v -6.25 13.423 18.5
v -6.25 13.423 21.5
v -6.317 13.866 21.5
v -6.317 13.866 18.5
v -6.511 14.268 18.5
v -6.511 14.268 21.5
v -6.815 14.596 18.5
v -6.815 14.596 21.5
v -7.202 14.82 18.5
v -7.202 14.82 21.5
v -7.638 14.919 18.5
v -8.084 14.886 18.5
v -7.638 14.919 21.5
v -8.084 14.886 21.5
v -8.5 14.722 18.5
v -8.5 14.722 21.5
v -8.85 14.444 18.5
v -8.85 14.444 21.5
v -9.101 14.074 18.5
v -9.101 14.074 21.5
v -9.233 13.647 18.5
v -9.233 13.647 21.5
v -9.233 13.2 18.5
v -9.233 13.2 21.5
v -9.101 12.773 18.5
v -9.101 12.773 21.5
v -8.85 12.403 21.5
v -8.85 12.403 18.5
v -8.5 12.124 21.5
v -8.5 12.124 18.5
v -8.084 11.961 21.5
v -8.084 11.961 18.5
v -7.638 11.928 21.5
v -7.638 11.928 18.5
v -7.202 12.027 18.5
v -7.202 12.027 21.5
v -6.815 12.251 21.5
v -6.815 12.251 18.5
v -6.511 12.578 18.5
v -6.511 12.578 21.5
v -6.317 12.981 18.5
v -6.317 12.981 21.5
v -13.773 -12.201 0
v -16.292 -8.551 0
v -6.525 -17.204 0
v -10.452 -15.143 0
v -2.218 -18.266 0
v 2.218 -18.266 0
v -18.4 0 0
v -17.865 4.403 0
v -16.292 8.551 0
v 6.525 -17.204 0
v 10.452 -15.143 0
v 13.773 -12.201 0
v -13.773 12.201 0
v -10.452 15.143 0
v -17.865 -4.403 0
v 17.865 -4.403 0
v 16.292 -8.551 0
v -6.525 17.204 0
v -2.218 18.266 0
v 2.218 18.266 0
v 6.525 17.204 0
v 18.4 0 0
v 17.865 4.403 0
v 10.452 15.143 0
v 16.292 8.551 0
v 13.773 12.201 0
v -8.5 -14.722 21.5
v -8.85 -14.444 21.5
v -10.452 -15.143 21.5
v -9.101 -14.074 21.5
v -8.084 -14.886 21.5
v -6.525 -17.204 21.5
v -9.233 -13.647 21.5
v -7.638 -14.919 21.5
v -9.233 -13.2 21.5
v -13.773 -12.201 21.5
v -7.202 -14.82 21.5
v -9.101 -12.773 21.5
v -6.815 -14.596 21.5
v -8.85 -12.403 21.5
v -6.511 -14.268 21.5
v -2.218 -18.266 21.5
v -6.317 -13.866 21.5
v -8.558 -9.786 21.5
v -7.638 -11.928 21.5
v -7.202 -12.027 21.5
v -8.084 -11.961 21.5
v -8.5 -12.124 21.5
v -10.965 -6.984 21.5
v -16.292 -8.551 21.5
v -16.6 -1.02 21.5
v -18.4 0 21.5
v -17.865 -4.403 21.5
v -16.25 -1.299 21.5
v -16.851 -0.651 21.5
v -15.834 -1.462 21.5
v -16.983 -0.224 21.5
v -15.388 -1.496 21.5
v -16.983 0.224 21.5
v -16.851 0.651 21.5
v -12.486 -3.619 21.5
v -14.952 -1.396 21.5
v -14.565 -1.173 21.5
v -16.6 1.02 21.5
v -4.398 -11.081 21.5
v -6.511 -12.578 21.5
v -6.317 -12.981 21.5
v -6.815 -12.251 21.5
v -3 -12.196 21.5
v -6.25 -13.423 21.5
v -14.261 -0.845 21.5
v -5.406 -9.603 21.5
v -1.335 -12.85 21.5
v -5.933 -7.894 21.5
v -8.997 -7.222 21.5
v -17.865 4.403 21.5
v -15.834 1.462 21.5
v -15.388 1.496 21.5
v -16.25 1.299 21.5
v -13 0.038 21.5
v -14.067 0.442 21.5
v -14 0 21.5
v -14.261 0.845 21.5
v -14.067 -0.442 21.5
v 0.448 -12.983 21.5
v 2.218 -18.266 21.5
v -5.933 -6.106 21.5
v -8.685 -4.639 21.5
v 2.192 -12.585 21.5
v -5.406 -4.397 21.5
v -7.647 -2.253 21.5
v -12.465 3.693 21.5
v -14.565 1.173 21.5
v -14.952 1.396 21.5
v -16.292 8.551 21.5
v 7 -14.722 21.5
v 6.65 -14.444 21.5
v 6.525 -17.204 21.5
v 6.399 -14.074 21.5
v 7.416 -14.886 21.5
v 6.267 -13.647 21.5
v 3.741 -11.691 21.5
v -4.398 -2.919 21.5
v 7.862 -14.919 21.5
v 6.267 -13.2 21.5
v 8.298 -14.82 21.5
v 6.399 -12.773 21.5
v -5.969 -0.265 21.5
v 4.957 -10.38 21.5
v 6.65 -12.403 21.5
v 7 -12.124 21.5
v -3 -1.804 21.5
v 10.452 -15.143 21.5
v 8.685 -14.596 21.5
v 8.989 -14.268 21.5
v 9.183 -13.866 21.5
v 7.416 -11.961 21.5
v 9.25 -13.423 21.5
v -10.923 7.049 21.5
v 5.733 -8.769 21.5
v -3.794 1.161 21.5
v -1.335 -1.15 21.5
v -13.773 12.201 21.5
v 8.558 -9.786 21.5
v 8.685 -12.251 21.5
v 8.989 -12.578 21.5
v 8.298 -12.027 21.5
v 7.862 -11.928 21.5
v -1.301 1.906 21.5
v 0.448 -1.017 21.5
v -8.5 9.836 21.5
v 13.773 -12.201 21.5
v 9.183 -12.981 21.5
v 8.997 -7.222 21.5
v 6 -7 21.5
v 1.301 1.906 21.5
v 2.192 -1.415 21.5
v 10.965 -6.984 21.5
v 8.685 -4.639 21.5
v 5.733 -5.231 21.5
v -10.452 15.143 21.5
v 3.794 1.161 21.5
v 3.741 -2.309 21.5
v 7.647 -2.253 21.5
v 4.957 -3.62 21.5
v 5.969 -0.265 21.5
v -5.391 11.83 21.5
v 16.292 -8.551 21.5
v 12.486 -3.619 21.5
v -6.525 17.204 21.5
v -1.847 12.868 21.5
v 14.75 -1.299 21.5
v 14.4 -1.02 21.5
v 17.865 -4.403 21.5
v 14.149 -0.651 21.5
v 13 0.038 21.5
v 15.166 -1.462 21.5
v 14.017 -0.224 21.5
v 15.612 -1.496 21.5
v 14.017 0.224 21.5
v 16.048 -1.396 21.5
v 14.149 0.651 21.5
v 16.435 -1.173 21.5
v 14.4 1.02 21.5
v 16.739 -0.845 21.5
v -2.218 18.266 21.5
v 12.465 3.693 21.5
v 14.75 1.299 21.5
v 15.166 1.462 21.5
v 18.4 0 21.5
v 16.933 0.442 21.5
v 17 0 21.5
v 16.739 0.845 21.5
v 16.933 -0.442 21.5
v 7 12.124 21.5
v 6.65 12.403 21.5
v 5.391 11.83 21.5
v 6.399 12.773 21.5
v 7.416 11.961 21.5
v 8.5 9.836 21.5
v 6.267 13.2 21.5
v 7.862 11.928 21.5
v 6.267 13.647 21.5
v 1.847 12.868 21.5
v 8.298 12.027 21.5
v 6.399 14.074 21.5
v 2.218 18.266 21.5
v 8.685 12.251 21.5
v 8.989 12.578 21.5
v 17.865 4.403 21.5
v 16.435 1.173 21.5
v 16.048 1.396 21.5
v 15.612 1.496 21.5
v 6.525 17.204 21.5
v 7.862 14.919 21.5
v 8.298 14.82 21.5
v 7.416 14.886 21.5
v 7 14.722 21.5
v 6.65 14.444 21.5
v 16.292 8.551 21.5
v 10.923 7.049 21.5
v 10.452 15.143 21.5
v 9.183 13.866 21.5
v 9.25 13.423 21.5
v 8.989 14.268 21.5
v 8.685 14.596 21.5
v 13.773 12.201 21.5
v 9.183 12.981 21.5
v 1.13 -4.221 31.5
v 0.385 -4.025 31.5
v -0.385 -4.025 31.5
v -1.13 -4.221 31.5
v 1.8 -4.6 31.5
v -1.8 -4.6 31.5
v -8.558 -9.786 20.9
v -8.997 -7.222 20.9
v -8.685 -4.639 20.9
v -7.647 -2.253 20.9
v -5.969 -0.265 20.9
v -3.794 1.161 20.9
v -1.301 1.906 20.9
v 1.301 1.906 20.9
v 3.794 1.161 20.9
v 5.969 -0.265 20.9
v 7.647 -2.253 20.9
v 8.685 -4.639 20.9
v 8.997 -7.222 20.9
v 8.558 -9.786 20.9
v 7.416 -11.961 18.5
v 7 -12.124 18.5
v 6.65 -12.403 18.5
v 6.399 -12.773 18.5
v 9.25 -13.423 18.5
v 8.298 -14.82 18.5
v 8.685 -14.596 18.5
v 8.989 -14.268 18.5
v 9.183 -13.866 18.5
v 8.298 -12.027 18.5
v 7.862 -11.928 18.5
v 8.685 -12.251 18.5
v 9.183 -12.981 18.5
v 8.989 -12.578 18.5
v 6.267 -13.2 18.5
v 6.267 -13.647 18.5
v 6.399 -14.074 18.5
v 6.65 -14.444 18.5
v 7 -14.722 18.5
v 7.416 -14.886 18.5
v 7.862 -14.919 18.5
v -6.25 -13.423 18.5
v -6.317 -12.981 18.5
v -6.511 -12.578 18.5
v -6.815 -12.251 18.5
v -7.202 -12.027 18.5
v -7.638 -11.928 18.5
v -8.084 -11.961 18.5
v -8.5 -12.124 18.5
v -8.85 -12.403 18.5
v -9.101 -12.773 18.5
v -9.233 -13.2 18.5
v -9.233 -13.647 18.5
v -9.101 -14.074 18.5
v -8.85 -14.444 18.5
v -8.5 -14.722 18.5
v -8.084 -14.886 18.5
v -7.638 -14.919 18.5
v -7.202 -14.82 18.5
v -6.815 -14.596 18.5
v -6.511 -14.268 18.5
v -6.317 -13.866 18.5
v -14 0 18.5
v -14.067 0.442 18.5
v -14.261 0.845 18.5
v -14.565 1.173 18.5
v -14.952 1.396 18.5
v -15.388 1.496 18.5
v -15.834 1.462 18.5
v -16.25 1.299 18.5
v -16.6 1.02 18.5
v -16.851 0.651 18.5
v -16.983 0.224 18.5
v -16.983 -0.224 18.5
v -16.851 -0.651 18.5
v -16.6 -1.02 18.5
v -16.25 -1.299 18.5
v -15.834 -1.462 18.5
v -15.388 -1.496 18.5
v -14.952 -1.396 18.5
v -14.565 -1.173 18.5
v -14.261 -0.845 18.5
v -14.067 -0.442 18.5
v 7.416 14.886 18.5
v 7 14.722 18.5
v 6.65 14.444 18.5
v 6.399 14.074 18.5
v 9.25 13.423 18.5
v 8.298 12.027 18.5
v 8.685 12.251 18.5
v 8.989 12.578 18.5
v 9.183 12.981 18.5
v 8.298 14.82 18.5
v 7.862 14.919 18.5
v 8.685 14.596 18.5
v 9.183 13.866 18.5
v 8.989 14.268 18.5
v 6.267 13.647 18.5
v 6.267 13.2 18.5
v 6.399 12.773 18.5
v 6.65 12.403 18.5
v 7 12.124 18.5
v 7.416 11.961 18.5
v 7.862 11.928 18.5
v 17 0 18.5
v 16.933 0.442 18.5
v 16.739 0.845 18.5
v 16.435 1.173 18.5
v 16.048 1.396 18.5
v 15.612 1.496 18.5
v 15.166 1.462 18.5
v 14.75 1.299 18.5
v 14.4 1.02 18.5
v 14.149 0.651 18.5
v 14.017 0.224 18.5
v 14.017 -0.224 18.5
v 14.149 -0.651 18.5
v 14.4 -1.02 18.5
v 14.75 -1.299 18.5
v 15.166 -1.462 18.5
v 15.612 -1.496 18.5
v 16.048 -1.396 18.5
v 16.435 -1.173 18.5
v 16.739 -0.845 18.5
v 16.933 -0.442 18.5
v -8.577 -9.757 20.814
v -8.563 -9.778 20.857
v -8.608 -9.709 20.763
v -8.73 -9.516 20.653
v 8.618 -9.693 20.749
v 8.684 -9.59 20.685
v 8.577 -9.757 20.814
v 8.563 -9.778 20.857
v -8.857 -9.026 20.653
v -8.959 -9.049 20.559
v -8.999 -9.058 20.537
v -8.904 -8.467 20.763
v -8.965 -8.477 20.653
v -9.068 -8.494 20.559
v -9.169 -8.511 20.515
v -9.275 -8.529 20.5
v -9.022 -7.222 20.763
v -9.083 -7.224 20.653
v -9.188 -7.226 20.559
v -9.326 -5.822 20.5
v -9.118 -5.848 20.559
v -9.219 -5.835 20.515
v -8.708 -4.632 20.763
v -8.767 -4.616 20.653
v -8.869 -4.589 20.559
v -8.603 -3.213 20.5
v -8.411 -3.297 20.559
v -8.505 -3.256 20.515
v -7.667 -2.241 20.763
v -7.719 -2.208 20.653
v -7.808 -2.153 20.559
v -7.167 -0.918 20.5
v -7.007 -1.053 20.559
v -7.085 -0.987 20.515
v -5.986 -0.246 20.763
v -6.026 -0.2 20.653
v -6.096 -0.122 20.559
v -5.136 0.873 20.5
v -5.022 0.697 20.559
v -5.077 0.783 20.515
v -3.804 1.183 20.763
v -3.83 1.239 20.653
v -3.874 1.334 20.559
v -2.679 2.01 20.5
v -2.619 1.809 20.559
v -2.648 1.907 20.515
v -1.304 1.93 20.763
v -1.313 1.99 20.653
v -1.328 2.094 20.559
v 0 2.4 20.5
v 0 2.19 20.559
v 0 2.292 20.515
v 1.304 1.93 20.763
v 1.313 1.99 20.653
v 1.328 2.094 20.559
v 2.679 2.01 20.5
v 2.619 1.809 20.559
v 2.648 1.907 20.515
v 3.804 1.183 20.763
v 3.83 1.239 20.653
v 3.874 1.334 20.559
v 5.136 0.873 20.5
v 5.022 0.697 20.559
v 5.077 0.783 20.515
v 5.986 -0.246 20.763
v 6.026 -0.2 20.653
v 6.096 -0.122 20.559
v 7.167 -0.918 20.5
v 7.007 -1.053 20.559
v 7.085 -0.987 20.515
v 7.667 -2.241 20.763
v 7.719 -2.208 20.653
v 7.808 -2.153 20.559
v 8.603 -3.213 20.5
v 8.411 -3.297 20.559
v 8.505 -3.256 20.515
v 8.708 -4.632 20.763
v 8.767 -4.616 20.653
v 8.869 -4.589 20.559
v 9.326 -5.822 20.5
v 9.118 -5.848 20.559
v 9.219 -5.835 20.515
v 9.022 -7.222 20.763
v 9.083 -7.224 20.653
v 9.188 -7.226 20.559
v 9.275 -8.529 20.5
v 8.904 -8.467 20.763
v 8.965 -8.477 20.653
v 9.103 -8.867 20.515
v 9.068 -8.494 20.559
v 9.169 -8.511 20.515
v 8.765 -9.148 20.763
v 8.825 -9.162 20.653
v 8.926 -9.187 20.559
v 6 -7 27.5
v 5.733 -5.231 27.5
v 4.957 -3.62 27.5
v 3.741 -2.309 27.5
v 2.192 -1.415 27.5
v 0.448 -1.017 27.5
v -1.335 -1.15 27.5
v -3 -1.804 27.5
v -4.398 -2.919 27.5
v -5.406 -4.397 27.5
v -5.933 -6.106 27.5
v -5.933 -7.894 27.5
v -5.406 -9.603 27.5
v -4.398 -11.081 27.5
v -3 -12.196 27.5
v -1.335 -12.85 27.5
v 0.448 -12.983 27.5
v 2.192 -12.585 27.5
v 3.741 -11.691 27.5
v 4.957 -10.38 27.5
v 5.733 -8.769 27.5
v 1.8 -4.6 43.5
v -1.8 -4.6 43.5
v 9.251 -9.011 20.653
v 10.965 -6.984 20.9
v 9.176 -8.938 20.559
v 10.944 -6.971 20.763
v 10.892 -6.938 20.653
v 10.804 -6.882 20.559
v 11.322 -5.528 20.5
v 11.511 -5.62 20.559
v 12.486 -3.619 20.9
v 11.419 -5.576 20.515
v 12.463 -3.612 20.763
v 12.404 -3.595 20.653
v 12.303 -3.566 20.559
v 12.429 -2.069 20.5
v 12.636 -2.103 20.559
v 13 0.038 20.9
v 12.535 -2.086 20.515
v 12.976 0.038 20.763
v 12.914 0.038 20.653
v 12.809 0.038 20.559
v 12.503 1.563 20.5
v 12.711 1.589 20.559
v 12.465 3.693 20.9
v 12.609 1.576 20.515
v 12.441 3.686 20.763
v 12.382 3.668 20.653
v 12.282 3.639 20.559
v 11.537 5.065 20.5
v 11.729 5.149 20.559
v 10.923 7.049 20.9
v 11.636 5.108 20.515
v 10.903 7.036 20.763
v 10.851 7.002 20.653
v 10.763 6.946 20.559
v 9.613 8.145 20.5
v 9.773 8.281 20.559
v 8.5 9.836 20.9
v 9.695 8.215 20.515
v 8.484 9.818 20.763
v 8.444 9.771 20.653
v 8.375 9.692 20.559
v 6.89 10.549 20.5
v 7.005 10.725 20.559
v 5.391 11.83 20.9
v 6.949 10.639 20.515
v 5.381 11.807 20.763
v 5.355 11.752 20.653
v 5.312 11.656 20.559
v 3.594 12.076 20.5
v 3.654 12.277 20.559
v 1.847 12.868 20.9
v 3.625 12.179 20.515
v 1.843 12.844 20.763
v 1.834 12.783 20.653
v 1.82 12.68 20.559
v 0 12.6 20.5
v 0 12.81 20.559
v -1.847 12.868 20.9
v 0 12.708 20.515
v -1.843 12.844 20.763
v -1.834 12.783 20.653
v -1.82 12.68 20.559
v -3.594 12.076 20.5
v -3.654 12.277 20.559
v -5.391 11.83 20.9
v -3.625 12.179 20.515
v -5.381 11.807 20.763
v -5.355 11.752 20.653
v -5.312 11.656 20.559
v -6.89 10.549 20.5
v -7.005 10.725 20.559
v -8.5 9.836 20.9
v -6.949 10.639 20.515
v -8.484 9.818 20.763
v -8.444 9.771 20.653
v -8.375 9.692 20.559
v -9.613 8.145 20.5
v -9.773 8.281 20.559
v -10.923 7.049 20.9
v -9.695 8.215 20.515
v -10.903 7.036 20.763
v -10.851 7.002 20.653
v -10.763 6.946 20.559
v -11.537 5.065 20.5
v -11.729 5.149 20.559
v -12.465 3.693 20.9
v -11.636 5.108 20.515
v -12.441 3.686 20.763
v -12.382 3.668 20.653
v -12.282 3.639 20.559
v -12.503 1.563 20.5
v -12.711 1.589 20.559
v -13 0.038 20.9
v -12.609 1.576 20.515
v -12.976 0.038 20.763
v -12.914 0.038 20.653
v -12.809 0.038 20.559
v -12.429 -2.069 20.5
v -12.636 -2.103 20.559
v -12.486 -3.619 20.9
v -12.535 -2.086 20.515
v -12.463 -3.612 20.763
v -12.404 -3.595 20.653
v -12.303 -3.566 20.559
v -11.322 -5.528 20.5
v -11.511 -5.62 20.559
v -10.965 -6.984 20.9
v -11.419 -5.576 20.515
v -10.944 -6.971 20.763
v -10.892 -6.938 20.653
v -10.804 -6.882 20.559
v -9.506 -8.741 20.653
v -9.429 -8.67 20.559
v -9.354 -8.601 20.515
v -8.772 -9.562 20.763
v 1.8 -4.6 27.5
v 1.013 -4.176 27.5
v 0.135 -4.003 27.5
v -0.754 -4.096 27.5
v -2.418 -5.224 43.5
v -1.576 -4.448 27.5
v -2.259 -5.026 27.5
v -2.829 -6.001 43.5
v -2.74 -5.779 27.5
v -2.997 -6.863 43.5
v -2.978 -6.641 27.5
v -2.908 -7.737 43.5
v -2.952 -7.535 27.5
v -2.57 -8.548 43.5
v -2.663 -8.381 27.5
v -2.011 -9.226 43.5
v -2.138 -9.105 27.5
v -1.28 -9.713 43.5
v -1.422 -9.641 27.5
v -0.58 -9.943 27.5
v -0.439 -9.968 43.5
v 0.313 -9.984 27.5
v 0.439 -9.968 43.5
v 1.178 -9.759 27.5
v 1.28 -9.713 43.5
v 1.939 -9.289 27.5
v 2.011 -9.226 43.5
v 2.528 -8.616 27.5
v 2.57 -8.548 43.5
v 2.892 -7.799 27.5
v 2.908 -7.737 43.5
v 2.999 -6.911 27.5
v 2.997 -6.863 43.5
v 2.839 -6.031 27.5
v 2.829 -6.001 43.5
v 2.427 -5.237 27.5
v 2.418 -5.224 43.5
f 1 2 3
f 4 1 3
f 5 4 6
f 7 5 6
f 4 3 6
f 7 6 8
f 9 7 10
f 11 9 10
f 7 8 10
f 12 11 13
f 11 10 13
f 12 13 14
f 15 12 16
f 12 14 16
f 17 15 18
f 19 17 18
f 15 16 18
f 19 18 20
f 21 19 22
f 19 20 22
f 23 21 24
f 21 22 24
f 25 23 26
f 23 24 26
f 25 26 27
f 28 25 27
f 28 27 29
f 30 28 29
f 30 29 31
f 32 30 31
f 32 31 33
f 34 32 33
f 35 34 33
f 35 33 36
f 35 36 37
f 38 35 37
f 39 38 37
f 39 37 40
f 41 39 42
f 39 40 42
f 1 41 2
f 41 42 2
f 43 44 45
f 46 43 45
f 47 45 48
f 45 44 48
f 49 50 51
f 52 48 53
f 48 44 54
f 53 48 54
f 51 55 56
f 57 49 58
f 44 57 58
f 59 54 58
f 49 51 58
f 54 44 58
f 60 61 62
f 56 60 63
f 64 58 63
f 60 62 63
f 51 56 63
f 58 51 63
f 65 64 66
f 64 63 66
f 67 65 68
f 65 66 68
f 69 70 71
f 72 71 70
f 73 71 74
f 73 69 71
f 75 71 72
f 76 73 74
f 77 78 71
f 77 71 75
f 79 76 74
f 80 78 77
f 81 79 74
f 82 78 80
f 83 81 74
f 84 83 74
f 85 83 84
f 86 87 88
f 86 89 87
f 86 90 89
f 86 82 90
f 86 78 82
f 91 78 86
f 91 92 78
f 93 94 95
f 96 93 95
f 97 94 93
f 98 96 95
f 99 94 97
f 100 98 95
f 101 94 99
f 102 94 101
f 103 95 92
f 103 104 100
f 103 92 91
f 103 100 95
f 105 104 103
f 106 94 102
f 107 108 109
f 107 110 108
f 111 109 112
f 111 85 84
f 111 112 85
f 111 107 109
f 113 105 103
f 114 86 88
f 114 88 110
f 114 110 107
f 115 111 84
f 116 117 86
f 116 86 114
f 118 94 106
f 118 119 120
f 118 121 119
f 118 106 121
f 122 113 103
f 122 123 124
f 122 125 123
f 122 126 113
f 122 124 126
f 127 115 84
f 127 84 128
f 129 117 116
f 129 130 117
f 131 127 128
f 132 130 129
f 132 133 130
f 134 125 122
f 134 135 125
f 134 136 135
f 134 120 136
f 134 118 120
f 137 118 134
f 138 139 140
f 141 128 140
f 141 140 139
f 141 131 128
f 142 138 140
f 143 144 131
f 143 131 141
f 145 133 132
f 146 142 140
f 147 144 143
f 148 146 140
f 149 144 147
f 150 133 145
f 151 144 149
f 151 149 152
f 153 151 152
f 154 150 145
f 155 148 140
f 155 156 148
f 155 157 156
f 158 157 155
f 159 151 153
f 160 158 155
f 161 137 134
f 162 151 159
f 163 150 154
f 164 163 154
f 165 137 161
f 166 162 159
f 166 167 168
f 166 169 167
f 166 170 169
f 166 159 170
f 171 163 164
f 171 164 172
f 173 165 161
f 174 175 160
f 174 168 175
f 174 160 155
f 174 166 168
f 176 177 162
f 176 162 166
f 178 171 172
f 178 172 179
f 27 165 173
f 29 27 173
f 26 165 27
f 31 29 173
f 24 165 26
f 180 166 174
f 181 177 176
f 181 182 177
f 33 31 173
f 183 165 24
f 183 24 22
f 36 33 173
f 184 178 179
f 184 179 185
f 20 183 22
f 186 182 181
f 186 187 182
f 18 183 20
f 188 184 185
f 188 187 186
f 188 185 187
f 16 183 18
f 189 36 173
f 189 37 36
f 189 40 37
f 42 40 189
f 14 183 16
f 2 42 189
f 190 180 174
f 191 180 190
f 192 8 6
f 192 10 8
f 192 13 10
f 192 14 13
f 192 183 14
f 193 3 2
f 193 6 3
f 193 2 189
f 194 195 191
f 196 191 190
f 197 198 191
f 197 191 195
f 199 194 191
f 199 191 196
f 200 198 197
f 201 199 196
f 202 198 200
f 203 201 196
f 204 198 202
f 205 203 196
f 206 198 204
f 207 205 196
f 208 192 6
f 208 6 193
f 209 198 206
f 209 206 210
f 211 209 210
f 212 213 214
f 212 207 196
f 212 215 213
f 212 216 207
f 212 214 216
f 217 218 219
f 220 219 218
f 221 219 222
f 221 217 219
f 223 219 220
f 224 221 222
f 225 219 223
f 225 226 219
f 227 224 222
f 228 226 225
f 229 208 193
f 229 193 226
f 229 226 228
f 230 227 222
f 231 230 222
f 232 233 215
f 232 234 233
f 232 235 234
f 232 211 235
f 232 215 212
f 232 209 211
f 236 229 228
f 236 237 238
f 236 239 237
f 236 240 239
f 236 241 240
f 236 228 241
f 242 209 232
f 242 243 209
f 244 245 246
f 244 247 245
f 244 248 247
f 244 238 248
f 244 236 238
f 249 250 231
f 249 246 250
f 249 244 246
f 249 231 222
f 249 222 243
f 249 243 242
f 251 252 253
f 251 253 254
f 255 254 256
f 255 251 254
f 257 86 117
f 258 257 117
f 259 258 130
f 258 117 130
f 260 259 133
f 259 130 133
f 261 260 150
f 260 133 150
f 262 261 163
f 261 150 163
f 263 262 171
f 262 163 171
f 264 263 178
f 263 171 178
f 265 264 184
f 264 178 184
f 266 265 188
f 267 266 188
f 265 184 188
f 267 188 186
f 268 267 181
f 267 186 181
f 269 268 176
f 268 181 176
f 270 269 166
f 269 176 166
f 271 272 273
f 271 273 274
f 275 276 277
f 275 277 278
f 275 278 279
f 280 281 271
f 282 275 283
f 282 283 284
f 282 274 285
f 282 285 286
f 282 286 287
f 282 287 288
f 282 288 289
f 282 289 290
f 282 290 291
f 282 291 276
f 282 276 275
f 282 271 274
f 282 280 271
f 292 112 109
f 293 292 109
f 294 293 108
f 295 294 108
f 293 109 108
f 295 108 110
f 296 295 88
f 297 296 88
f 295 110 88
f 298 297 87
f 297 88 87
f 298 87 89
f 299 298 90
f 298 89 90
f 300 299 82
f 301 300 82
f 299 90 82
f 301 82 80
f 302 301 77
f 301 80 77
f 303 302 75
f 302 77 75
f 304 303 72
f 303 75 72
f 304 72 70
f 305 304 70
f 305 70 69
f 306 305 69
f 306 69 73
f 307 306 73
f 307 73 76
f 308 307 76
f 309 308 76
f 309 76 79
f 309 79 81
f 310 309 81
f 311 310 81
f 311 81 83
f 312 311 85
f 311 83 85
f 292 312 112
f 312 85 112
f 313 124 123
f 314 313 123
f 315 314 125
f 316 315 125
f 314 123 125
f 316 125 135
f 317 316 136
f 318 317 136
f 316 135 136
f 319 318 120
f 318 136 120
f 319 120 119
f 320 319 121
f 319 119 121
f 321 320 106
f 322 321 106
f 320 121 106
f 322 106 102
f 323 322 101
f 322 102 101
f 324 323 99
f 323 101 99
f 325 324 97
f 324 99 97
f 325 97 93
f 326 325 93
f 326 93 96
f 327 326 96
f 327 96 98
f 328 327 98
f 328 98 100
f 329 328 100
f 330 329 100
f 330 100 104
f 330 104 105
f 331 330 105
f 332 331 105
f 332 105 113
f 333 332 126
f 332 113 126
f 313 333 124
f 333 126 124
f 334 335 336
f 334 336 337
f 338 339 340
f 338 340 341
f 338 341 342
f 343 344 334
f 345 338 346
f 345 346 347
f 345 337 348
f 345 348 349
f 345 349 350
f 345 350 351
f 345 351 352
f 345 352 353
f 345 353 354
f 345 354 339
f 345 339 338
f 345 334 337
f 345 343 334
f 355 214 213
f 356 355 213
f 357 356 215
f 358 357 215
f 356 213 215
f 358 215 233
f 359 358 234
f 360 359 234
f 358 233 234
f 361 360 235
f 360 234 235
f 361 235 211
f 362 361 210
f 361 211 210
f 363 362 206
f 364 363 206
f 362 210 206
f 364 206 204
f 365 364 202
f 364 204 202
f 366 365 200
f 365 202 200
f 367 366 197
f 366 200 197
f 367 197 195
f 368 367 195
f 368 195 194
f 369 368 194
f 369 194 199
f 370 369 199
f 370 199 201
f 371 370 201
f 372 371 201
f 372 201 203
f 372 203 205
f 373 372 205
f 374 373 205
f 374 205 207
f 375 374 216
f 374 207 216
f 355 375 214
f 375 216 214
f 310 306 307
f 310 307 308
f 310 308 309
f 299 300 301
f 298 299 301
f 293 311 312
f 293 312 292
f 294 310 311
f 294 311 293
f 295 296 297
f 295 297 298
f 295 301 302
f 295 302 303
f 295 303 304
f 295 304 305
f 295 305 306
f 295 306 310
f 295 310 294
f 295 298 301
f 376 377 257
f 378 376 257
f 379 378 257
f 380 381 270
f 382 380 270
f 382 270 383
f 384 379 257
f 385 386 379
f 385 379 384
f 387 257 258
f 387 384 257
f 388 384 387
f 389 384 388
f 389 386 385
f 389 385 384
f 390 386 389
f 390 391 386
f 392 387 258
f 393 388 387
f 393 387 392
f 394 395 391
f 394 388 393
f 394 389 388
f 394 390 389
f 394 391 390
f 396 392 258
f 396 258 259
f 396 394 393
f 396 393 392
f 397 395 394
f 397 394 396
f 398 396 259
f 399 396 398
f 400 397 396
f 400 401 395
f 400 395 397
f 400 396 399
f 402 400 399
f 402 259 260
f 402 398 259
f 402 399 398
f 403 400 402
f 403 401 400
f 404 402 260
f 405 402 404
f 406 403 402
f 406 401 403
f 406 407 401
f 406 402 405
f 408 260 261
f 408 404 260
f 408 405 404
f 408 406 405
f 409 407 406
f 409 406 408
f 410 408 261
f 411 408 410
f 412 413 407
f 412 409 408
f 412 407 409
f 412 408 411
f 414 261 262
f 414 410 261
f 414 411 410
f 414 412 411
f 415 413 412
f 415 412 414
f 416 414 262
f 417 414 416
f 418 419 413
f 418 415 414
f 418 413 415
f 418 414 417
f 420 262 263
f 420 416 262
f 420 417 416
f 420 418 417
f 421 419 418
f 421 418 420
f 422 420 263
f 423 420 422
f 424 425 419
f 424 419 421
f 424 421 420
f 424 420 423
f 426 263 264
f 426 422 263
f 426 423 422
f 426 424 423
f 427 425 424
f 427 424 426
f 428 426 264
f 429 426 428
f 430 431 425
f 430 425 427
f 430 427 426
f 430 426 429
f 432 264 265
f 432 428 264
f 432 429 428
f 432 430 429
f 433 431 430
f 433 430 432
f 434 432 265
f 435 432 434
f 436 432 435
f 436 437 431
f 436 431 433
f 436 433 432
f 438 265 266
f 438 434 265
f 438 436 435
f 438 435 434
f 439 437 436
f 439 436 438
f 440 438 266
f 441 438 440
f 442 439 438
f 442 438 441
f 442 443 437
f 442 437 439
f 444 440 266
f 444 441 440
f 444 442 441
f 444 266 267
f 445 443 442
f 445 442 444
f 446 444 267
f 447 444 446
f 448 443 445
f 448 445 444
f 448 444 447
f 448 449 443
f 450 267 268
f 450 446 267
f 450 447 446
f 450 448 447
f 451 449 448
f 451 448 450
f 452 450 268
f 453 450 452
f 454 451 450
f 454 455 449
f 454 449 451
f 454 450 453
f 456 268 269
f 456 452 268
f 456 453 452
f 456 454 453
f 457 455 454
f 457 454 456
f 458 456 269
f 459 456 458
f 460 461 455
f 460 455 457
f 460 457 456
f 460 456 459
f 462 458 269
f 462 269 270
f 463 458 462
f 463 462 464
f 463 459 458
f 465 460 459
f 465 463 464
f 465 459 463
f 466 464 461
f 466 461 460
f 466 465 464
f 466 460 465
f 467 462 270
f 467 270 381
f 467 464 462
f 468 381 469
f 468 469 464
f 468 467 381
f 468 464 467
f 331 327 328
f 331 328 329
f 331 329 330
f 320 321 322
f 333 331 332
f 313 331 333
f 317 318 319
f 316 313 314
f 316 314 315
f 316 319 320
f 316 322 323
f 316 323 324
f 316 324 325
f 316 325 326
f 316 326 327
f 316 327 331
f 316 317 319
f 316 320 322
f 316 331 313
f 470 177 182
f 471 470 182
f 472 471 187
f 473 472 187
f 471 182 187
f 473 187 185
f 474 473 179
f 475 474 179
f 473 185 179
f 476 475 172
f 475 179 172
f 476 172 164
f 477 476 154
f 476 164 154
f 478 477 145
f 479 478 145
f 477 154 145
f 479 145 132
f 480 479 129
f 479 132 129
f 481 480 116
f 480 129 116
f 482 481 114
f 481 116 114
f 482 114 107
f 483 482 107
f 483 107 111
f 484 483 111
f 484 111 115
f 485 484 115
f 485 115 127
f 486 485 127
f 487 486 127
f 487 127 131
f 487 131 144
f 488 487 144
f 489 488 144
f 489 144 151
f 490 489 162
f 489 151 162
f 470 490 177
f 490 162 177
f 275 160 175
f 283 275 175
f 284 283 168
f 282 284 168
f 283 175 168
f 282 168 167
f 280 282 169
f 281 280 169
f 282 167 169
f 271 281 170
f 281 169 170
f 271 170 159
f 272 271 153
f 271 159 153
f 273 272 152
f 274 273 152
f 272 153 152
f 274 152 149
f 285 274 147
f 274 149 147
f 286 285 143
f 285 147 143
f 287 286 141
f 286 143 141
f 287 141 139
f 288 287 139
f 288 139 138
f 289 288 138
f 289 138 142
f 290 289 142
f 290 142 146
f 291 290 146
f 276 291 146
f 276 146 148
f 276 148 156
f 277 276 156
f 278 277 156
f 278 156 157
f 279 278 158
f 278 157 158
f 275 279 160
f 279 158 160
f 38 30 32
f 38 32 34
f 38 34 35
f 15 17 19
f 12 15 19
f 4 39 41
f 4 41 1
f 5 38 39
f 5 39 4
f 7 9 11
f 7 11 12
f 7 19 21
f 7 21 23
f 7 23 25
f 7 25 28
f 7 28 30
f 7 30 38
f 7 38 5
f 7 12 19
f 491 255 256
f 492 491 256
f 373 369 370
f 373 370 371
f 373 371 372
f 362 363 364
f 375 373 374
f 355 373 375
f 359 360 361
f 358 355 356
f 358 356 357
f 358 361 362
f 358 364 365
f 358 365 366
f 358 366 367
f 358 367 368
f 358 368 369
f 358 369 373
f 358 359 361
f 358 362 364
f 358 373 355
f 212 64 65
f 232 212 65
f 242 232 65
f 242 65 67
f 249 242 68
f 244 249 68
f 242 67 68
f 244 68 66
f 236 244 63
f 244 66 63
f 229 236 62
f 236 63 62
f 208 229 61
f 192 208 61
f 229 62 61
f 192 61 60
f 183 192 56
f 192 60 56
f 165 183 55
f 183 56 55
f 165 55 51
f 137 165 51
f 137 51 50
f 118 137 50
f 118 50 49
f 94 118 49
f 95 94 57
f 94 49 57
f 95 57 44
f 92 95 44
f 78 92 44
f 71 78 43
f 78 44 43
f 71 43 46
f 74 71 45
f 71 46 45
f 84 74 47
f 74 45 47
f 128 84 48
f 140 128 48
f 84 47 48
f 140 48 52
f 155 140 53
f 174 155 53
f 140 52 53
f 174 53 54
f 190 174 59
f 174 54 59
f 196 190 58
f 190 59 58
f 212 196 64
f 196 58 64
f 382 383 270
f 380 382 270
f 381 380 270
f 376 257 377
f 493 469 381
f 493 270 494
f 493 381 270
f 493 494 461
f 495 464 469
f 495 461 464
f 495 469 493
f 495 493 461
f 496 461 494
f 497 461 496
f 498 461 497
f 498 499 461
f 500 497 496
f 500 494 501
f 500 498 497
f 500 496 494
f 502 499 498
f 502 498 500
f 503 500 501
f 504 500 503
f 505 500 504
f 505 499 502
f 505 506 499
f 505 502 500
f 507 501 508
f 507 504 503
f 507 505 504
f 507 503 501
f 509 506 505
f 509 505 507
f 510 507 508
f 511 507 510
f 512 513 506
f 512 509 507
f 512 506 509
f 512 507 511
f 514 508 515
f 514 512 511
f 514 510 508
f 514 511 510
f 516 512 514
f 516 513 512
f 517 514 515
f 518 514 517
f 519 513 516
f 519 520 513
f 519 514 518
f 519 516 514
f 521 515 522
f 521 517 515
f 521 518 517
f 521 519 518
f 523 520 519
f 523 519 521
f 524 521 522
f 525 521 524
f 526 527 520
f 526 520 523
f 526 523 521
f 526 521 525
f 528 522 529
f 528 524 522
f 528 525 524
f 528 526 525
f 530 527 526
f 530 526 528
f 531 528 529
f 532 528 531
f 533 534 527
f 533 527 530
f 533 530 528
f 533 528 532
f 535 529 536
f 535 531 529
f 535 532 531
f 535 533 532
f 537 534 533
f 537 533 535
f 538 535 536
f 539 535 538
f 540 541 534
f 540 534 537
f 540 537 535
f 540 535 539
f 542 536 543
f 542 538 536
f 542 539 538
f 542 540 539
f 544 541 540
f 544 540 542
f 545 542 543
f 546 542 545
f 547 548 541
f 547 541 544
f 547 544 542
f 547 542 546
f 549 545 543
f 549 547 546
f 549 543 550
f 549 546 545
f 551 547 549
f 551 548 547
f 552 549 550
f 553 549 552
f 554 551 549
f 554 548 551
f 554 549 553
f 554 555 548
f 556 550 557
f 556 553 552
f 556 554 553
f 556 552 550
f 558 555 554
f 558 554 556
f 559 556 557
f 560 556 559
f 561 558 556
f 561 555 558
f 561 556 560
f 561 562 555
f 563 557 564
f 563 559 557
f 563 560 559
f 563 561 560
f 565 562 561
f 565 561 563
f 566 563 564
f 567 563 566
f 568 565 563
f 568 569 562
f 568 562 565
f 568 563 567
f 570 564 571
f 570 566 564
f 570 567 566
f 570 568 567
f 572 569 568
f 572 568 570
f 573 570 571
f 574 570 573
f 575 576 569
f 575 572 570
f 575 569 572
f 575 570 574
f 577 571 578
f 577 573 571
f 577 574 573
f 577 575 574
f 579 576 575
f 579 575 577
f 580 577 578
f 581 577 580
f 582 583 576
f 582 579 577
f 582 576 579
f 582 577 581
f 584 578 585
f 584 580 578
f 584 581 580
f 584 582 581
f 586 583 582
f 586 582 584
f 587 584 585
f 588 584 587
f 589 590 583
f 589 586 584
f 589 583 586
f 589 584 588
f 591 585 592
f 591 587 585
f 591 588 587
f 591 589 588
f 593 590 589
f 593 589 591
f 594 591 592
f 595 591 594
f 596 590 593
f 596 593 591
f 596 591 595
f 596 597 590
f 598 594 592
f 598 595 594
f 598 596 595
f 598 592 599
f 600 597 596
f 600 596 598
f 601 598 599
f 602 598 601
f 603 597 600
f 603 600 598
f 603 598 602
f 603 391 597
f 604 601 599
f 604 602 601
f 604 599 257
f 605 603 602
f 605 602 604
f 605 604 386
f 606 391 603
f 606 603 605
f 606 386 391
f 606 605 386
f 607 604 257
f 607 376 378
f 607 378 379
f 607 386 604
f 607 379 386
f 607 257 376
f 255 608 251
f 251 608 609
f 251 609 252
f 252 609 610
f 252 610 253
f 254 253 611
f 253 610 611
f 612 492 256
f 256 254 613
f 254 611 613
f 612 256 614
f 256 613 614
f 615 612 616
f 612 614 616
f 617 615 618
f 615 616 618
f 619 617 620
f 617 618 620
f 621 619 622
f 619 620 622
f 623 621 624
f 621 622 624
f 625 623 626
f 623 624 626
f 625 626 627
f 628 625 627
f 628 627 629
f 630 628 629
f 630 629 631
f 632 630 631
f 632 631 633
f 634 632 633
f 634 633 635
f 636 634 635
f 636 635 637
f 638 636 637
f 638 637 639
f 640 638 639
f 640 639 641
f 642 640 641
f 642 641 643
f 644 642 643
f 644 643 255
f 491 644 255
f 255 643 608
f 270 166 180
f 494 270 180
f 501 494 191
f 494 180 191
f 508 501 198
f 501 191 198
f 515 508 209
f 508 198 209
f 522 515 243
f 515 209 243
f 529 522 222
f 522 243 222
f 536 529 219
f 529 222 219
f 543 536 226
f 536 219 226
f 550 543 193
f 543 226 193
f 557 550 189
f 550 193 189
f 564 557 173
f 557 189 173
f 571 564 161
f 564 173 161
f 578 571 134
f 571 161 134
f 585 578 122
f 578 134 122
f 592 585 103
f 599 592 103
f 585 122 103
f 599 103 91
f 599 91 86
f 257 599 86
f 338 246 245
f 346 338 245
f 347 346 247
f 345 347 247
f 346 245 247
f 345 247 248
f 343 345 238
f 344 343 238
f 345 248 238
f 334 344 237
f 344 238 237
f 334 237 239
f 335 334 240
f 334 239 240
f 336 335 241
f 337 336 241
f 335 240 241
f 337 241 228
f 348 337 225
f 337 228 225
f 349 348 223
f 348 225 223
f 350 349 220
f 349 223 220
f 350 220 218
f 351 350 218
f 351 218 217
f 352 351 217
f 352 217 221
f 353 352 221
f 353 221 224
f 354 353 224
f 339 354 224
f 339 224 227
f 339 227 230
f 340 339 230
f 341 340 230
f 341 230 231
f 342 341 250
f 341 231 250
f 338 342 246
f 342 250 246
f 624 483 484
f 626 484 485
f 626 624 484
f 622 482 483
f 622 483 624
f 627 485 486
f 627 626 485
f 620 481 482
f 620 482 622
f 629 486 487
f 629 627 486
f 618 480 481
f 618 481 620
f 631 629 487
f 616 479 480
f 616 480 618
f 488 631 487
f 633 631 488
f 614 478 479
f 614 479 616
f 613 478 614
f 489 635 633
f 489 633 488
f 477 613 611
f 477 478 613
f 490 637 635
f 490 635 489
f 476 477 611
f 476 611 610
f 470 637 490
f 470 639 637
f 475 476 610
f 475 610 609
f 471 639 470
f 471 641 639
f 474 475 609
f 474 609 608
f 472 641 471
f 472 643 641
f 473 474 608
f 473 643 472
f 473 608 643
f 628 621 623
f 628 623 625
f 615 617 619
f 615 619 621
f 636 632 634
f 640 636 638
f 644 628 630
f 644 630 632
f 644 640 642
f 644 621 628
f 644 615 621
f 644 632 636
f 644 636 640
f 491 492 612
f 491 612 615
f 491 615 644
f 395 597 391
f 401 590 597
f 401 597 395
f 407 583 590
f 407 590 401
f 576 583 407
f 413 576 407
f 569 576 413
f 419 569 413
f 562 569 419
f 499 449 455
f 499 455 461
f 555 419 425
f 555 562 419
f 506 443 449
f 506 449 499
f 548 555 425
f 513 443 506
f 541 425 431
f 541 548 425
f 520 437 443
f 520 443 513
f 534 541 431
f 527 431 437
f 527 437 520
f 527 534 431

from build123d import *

# Parameters (mm, degrees)
CROQUIS1_R              = 18.4
SALIENTE_EXTRUIR1_DEPTH = 21.5
CROQUIS3_R              = 6
SALIENTE_EXTRUIR2_DEPTH = 6
SALIENTE_EXTRUIR3_DEPTH = 16
SALIENTE_EXTRUIR4_DEPTH = 4
CORTAR_EXTRUIR1_DEPTH   = 1
REDONDEO4_R             = 0.4
CROQUIS7_R              = 1.5
CORTAR_EXTRUIR2_DEPTH   = 3


with BuildPart() as part:
    # Croquis1 → Saliente-Extruir1 (new body)
    with BuildSketch(Plane.XY):
        Circle(CROQUIS1_R)
    extrude(amount=SALIENTE_EXTRUIR1_DEPTH)

    # Croquis3 → Saliente-Extruir2 (add)
    with BuildSketch(Plane.XY.offset(21.5)):
        with Locations((0, -7)):
            Circle(CROQUIS3_R)
    extrude(amount=SALIENTE_EXTRUIR2_DEPTH)

    # Croquis4 → Saliente-Extruir3 (add)
    with BuildSketch(Plane.XY.offset(27.5)):
        with BuildLine():
            Line((1.8, -4.6), (-1.8, -4.6))
            ThreePointArc((-1.8, -4.6), (0, -10), (1.8, -4.6))
        make_face()
    extrude(amount=SALIENTE_EXTRUIR3_DEPTH)

    # Croquis5 → Saliente-Extruir4 (add)
    with BuildSketch(Plane.XY.offset(27.5)):
        with BuildLine():
            Line((-1.8, -4.6), (1.8, -4.6))
            ThreePointArc((1.8, -4.6), (0, -4), (-1.8, -4.6))
        make_face()
    extrude(amount=SALIENTE_EXTRUIR4_DEPTH)

    # Croquis6 → Cortar-Extruir1 (cut)
    with BuildSketch(Plane.XY.offset(21.5)):
        with BuildLine():
            ThreePointArc((8.558025235, -9.785714286), (0, 13), (-8.558025235, -9.785714286))
            ThreePointArc((-8.558025235, -9.785714286), (0, 2), (8.558025235, -9.785714286))
        make_face()
    extrude(amount=-CORTAR_EXTRUIR1_DEPTH, mode=Mode.SUBTRACT)

    # Redondeo4
    redondeo4_edges = [part.edges().sort_by_distance(p)[0] for p in [
        (0, 2, 20.5),
        (0, 13, 20.5),
    ]]
    fillet(redondeo4_edges, radius=REDONDEO4_R)

    # Croquis7 → Cortar-Extruir2 (cut)
    with BuildSketch(Plane.XY.offset(21.5)):
        with Locations((-15.4999946, 0)):
            Circle(CROQUIS7_R)
        with Locations((-7.7499973, 13.423389082)):
            Circle(CROQUIS7_R)
        with Locations((7.7499973, 13.423389082)):
            Circle(CROQUIS7_R)
        with Locations((15.4999946, 0)):
            Circle(CROQUIS7_R)
        with Locations((7.7499973, -13.423389082)):
            Circle(CROQUIS7_R)
        with Locations((-7.7499973, -13.423389082)):
            Circle(CROQUIS7_R)
    extrude(amount=-CORTAR_EXTRUIR2_DEPTH, mode=Mode.SUBTRACT)


solid = part.part
